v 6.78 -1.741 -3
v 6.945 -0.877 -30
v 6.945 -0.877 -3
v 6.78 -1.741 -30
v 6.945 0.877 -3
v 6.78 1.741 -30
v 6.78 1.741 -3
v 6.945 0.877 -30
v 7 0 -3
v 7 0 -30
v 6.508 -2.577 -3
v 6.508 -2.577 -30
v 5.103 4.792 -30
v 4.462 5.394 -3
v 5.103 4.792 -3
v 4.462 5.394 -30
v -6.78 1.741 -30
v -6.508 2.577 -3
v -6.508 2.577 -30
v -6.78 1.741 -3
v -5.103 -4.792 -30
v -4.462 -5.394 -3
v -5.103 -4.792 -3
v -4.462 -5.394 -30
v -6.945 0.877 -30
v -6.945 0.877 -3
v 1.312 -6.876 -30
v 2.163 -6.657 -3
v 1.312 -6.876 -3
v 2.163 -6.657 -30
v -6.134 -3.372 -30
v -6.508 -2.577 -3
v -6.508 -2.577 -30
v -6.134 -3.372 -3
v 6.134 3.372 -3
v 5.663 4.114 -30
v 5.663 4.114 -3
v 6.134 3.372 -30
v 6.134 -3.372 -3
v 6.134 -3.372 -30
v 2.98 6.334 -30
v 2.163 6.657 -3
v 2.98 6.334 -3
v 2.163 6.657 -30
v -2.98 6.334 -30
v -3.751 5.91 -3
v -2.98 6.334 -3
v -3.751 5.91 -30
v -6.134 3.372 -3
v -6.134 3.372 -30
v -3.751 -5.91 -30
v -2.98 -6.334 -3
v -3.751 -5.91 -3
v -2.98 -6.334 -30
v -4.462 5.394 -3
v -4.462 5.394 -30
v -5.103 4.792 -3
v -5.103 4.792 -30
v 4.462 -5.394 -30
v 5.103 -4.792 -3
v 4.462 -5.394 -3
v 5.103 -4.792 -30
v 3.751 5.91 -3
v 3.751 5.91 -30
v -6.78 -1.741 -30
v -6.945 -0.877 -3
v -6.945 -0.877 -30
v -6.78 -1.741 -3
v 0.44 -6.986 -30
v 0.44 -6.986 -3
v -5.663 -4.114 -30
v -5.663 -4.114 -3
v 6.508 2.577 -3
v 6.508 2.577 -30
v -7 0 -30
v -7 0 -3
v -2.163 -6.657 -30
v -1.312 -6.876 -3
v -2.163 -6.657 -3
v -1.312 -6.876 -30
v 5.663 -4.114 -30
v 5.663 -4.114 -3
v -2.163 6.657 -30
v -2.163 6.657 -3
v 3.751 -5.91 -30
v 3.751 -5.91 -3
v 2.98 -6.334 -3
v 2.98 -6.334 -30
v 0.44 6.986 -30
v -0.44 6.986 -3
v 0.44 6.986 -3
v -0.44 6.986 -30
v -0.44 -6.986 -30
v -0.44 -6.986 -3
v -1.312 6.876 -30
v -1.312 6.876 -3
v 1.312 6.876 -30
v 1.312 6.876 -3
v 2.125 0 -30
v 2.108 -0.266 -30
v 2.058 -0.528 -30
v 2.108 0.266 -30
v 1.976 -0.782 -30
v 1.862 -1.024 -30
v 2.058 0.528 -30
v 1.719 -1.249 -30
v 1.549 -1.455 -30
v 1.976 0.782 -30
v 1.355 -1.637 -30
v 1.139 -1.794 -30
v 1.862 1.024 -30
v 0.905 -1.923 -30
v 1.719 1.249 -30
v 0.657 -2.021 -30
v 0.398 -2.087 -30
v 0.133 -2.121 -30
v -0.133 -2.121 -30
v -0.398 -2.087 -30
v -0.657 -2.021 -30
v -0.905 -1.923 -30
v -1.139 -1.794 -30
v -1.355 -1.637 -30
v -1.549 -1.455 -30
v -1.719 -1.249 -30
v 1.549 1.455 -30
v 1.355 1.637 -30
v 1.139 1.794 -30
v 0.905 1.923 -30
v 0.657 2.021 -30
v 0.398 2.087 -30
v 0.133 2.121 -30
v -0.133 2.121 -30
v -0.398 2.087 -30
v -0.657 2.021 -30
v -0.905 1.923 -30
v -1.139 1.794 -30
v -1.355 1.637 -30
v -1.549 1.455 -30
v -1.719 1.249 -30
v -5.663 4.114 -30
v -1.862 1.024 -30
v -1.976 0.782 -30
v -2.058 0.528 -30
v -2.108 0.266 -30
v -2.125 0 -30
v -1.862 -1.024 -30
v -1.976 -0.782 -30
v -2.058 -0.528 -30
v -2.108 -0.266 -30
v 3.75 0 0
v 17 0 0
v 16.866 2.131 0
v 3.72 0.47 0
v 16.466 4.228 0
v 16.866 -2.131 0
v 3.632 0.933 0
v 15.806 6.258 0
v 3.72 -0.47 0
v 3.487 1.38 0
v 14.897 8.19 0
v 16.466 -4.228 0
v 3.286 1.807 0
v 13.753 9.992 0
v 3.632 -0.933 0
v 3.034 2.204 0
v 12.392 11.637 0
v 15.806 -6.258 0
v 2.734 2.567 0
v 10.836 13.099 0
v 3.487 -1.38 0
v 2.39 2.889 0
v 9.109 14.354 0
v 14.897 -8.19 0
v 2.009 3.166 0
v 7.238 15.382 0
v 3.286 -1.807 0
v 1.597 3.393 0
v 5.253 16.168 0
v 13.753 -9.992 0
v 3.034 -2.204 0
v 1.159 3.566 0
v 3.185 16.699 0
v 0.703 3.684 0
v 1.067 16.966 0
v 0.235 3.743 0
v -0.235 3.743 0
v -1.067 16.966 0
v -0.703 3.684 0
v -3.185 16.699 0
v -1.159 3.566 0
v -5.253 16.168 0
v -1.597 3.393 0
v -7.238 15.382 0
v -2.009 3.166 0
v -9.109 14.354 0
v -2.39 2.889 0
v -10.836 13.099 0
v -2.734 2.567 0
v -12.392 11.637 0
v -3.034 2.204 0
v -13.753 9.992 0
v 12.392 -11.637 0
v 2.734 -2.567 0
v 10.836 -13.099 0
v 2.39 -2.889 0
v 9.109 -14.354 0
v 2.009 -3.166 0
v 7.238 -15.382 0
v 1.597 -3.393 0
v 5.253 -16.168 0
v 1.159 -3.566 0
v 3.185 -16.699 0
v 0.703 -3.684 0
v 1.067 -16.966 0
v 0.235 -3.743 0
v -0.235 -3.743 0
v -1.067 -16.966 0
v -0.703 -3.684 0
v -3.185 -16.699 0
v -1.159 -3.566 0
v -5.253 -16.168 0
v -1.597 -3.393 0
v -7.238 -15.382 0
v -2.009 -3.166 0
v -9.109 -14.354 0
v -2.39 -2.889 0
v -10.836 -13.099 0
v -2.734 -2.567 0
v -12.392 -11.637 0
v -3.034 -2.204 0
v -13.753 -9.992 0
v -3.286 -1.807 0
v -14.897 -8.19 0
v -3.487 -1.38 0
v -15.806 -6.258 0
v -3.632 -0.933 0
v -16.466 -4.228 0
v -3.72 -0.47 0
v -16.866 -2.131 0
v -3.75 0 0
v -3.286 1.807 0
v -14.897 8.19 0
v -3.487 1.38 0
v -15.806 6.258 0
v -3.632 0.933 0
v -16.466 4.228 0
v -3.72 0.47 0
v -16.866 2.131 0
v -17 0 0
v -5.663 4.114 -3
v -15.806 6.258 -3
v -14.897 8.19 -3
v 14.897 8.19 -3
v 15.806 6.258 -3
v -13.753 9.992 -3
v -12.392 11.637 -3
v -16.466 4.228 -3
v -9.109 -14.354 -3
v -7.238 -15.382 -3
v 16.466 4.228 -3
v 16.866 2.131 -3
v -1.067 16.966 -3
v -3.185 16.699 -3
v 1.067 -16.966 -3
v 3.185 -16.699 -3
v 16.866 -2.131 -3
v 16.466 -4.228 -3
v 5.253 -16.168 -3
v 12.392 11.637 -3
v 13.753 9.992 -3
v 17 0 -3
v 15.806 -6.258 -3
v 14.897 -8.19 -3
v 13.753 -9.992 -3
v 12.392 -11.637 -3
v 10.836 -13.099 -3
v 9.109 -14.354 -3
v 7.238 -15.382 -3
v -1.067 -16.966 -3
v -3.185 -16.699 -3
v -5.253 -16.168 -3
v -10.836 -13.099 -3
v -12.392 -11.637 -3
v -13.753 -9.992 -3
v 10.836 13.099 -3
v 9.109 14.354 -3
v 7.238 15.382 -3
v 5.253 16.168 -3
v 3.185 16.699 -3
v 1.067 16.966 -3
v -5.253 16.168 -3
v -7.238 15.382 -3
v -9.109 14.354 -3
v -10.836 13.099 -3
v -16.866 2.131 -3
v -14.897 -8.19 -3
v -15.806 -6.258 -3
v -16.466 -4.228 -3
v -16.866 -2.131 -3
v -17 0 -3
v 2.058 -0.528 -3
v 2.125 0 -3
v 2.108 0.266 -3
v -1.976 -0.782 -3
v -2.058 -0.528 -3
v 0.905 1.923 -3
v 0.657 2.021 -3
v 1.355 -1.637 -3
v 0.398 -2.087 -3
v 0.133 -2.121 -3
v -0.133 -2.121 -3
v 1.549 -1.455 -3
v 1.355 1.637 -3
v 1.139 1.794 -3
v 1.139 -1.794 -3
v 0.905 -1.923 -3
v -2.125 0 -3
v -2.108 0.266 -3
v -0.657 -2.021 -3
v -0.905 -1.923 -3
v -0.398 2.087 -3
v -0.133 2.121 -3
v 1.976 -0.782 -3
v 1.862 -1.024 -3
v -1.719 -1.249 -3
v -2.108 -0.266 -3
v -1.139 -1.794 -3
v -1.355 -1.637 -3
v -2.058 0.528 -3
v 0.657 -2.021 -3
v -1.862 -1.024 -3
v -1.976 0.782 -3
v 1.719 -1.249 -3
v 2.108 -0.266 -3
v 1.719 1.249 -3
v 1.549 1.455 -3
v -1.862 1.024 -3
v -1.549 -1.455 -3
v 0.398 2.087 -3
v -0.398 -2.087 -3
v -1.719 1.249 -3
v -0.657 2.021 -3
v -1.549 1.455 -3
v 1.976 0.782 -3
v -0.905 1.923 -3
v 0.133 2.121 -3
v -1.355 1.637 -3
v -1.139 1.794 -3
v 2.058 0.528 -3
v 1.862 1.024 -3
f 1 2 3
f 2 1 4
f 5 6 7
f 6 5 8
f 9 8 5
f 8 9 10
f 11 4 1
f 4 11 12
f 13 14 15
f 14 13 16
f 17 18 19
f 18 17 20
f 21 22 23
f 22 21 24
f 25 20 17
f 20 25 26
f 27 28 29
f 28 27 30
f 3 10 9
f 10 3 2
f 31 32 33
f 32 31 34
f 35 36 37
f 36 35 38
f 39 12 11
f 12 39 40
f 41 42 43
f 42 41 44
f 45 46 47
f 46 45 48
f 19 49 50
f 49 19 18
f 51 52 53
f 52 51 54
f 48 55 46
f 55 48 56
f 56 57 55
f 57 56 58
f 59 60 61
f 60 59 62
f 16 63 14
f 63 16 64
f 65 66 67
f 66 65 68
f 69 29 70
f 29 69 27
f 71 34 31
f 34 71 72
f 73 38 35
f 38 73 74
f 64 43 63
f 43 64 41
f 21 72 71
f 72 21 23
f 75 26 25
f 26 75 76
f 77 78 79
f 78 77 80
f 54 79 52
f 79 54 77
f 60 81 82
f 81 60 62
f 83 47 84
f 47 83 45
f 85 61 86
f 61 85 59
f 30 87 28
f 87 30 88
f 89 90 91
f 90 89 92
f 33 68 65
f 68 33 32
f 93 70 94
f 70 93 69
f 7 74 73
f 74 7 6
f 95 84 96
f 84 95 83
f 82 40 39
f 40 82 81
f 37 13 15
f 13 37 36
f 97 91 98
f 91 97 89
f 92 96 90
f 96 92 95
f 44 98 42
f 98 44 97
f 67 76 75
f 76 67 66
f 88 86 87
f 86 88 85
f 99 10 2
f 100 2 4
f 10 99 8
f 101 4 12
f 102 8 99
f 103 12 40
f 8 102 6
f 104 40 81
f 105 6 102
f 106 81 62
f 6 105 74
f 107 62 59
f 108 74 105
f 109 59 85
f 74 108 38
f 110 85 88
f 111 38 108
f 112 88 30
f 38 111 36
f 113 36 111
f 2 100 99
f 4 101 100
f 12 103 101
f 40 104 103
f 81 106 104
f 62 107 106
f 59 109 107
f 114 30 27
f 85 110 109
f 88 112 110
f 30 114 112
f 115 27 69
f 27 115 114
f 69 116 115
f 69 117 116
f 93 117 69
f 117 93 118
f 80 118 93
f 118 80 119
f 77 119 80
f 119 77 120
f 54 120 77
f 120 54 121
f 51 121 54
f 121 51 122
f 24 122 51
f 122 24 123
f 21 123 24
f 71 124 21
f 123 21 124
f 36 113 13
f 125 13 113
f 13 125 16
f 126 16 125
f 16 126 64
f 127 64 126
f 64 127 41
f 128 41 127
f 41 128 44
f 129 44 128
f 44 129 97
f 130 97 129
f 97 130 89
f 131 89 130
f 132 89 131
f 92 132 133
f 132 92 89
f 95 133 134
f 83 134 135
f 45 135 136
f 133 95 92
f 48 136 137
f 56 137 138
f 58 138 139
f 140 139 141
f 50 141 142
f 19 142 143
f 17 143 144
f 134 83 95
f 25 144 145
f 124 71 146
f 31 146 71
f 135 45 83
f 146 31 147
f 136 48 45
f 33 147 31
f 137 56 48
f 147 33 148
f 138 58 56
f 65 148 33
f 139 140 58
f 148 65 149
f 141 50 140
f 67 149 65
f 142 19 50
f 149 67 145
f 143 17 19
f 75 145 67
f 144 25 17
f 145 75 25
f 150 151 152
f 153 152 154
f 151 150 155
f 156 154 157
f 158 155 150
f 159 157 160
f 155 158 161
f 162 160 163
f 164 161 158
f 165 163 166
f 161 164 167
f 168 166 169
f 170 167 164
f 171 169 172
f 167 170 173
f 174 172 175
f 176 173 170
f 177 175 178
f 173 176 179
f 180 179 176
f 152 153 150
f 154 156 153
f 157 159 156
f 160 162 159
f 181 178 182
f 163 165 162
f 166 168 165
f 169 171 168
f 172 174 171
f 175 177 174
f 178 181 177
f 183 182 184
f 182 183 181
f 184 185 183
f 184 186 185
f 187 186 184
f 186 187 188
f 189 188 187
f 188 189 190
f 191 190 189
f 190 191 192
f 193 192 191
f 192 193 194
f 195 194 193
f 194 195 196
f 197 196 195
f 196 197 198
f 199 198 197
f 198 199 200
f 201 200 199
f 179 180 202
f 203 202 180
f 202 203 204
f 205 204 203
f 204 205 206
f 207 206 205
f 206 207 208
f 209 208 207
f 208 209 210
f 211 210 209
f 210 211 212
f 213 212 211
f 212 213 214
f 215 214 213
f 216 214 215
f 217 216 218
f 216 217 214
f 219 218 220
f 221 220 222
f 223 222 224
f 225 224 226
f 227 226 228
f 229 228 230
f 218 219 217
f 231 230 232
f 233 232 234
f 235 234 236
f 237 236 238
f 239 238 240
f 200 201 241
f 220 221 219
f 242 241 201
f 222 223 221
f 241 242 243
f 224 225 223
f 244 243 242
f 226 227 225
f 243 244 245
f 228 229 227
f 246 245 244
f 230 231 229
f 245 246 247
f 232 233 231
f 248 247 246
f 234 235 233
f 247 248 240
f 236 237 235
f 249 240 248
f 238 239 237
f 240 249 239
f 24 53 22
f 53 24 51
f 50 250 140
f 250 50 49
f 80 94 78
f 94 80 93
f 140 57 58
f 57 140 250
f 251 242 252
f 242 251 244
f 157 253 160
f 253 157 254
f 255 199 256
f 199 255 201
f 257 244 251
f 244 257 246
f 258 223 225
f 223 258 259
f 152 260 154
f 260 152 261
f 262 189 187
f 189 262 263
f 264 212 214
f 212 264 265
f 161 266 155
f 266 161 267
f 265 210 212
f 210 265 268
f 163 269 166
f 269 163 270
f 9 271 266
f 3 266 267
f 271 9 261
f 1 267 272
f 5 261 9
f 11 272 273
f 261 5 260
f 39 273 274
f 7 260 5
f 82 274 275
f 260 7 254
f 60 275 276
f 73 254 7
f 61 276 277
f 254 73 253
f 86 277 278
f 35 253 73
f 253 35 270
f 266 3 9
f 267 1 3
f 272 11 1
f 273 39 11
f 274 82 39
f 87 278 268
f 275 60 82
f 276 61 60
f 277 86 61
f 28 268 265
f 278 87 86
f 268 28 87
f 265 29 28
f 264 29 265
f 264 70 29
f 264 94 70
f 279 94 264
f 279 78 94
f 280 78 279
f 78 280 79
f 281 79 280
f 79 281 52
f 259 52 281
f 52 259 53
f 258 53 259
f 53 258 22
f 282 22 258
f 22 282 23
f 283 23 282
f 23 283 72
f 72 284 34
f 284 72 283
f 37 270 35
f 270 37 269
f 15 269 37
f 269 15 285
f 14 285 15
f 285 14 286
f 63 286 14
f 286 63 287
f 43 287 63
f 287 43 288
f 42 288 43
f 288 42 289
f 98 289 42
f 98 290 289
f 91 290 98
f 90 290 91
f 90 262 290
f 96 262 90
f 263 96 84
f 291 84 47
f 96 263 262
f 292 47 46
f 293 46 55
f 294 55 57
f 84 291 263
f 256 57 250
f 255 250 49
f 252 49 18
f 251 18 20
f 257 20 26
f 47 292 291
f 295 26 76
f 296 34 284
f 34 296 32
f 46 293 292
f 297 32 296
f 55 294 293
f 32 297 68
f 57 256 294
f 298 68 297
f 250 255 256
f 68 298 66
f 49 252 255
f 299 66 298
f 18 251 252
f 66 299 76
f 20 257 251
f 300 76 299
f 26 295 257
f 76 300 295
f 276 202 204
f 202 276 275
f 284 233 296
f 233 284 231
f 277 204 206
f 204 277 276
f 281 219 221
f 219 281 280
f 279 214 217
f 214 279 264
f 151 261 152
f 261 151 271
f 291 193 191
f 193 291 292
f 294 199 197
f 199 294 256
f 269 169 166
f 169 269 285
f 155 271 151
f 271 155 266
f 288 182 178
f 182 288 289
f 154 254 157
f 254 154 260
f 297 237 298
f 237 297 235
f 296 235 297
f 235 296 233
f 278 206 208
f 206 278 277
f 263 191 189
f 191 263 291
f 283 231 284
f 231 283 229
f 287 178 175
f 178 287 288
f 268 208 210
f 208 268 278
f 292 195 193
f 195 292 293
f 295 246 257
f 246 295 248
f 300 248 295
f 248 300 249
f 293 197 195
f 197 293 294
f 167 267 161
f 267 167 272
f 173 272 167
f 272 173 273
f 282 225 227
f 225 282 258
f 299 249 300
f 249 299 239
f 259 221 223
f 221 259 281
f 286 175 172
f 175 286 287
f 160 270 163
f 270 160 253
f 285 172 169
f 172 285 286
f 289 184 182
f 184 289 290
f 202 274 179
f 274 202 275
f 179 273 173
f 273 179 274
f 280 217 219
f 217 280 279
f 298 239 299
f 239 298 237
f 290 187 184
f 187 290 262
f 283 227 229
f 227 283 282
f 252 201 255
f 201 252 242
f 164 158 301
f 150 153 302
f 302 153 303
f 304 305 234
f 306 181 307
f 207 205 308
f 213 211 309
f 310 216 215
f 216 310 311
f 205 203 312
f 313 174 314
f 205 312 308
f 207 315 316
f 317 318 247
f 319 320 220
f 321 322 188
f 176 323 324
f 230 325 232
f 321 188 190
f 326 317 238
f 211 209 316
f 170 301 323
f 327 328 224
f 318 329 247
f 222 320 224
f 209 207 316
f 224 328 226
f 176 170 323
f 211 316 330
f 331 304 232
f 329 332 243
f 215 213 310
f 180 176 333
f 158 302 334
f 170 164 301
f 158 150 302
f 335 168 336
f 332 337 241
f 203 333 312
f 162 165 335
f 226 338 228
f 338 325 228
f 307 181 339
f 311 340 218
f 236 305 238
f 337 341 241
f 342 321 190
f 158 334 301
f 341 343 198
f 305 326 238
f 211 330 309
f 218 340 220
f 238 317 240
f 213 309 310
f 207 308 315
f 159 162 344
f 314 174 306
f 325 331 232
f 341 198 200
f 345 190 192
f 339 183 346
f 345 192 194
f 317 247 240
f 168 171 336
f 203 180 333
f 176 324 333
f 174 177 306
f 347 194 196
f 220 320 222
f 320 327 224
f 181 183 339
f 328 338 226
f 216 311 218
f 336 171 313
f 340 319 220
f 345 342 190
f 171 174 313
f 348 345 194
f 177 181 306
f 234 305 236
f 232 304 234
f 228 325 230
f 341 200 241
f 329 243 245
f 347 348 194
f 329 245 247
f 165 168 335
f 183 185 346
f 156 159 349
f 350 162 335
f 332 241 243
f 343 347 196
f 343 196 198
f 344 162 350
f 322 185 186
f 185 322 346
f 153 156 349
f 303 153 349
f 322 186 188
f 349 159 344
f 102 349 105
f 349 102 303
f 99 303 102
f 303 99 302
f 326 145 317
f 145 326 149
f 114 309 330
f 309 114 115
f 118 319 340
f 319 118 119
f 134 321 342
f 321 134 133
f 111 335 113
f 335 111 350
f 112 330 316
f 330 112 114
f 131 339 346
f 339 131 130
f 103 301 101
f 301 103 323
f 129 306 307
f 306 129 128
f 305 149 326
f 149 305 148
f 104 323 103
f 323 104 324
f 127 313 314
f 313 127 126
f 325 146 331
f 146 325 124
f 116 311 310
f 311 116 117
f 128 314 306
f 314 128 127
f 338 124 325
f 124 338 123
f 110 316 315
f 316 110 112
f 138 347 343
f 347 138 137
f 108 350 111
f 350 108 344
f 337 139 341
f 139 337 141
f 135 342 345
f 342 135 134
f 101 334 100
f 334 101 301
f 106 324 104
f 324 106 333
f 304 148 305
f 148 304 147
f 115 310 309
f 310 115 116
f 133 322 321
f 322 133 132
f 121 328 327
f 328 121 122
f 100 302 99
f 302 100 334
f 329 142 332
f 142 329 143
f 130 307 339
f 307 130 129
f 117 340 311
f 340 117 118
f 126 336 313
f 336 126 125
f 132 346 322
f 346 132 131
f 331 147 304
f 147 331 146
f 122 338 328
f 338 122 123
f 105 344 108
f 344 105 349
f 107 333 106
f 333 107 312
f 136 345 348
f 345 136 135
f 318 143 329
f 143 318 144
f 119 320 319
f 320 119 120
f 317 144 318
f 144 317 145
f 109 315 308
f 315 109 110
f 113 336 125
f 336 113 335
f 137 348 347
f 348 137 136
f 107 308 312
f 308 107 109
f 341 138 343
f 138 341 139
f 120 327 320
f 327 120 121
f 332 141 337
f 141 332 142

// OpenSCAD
$fn = 50;


difference() {
	union() {
		translate(v = [0, 0, -30.0000000000]) {
			cylinder(h = 30, r = 7.0000000000);
		}
		translate(v = [0, 0, -3.0000000000]) {
			cylinder(h = 3, r = 17.0000000000);
		}
	}
	union() {
		translate(v = [0, 0, 0]) {
			rotate(a = [0, 0, 0]) {
				difference() {
					union() {
						#translate(v = [0, 0, -30.0000000000]) {
							cylinder(h = 30, r = 2.0000000000);
						}
						#translate(v = [0, 0, -3]) {
							cylinder(h = 3, r1 = 2.1250000000, r2 = 3.7500000000);
						}
						#translate(v = [0, 0, -30.0000000000]) {
							cylinder(h = 30, r = 2.1250000000);
						}
						#translate(v = [0, 0, -30.0000000000]) {
							cylinder(h = 30, r = 2.0000000000);
						}
					}
					union();
				}
			}
		}
	}
}
